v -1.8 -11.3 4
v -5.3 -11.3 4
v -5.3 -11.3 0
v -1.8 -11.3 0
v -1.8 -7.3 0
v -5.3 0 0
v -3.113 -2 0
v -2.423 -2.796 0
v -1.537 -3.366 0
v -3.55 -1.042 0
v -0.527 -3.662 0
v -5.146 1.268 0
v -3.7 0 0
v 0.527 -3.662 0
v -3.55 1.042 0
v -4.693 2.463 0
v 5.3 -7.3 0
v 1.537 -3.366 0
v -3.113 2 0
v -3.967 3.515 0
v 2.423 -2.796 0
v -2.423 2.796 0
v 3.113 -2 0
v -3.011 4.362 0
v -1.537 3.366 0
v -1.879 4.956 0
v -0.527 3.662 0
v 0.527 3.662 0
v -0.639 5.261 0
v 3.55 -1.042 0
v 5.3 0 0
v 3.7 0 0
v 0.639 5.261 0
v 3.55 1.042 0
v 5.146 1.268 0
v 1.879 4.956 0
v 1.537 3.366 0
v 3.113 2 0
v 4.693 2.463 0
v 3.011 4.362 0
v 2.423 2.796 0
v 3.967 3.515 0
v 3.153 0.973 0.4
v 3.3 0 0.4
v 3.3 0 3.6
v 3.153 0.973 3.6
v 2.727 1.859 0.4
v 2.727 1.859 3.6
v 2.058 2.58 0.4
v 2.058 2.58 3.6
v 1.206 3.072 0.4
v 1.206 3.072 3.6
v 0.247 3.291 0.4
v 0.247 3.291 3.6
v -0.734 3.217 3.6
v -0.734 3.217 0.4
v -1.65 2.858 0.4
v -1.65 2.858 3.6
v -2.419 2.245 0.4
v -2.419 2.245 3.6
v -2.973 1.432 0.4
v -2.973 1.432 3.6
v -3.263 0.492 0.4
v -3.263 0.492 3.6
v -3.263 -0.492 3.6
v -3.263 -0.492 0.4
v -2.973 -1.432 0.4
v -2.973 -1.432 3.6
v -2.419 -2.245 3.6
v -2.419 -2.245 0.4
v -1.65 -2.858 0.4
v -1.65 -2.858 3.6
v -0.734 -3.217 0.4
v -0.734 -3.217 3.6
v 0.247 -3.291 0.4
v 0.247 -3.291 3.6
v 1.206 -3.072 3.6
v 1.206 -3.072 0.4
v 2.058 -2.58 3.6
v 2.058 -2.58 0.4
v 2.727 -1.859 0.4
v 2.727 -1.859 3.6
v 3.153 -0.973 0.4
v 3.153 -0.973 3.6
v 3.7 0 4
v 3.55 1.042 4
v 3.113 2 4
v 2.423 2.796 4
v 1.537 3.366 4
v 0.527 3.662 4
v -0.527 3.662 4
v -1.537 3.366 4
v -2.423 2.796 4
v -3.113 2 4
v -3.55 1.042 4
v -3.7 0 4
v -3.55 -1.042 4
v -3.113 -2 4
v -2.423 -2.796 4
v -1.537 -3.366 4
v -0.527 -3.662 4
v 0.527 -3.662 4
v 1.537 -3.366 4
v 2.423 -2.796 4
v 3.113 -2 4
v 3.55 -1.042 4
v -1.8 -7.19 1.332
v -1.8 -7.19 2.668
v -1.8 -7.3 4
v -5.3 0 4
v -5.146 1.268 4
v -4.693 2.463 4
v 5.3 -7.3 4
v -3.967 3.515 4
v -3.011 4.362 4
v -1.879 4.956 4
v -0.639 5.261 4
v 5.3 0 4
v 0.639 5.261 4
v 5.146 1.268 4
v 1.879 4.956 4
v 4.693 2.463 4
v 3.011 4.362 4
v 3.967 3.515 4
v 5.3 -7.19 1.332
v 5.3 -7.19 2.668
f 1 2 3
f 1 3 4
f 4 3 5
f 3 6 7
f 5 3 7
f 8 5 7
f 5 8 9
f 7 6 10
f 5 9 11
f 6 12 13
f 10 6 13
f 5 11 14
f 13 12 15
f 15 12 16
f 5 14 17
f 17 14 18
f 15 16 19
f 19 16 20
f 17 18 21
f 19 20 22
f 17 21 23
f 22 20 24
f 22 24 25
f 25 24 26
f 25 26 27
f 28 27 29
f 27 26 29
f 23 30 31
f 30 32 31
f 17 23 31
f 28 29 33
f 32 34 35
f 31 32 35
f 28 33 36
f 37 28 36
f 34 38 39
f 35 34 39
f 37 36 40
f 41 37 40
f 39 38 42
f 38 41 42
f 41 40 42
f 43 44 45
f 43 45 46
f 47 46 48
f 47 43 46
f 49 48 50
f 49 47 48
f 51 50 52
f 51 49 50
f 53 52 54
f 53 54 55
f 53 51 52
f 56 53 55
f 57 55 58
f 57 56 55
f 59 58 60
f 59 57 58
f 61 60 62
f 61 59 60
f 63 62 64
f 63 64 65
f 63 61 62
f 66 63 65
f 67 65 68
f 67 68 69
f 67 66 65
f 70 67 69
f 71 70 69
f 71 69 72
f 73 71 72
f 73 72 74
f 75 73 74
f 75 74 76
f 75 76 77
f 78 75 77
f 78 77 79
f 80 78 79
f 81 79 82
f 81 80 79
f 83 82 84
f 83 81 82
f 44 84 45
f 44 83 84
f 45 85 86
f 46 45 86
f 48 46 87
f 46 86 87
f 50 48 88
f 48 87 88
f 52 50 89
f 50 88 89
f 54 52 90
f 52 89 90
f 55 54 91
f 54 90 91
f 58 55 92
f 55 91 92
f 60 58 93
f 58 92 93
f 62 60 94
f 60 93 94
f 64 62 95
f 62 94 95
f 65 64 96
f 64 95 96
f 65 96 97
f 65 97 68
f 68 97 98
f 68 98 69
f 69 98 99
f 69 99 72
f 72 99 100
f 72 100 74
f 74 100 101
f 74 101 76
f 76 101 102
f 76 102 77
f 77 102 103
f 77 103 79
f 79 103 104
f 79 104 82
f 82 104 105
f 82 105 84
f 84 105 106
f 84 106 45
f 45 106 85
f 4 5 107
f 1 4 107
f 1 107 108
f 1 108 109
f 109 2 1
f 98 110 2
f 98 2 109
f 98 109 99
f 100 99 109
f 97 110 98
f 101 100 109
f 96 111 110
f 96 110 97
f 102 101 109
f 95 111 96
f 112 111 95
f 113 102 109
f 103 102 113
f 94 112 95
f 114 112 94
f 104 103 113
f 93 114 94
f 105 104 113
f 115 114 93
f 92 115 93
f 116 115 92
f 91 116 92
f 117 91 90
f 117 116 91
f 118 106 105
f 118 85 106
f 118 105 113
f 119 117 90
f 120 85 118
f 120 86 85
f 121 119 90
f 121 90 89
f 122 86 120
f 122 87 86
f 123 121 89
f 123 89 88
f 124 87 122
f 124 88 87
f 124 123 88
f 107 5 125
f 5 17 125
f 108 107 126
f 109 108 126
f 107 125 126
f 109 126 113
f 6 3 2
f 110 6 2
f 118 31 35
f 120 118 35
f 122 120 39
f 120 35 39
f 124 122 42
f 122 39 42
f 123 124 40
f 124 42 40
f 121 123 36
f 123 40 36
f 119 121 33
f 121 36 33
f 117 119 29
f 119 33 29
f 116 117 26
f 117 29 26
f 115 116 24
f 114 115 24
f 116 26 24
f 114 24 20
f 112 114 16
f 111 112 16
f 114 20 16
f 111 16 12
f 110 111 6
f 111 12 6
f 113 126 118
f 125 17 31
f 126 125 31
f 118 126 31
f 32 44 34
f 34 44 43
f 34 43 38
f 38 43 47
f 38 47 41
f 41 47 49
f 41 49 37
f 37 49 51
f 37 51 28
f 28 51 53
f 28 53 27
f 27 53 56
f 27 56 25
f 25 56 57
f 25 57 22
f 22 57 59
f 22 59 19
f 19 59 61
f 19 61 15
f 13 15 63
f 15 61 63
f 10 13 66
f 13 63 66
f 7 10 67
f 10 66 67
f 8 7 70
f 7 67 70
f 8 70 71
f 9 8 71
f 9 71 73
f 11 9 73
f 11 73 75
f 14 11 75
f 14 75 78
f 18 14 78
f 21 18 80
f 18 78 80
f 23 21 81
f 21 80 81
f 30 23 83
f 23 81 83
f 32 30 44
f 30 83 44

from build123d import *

# Parameters (mm, degrees)
F0_R     = 3.3
F1_DEPTH = 4
F2_W     = 3.5
F2_H     = 4
F3_DEPTH = 4
F4_SIZE  = 0.4
F5_R     = 16.2
F6_DEPTH = 7.1


with BuildPart() as f1:
    # F0 (on Top) → F1 (new body)
    with BuildSketch(Plane.XY):
        with BuildLine():
            ThreePointArc((-5.3, 0), (0, -5.3), (5.3, 0))
            ThreePointArc((5.3, 0), (0, 5.3), (-5.3, 0))
        make_face()
        Circle(F0_R, mode=Mode.SUBTRACT)
        with BuildLine():
            Line((5.3, -7.3), (5.3, 0))
            ThreePointArc((5.3, 0), (0, -5.3), (-5.3, 0))
            Line((-5.3, 0), (-5.3, -7.3))
            Line((-5.3, -7.3), (5.3, -7.3))
        make_face()
    extrude(amount=F1_DEPTH)

    # F2 (on face) → F3 (join)
    with BuildSketch(Plane.XZ.offset(7.3)):
        with Locations((-3.55, 2)):
            Rectangle(F2_W, F2_H)
    extrude(amount=F3_DEPTH)

    # F4
    f4_edges = [f1.edges().sort_by_distance(p)[0] for p in [
        (-3.3, 0, 4),
        (-3.3, 0, 0),
    ]]
    chamfer(f4_edges, length=F4_SIZE)

    # F5 (on face) → F6 (cut, through all)
    with BuildSketch(Plane.YZ.offset(5.3)):
        with Locations((-23.376069, 2)):
            Circle(F5_R)
    extrude(amount=-F6_DEPTH, mode=Mode.SUBTRACT)


solid = f1.part
